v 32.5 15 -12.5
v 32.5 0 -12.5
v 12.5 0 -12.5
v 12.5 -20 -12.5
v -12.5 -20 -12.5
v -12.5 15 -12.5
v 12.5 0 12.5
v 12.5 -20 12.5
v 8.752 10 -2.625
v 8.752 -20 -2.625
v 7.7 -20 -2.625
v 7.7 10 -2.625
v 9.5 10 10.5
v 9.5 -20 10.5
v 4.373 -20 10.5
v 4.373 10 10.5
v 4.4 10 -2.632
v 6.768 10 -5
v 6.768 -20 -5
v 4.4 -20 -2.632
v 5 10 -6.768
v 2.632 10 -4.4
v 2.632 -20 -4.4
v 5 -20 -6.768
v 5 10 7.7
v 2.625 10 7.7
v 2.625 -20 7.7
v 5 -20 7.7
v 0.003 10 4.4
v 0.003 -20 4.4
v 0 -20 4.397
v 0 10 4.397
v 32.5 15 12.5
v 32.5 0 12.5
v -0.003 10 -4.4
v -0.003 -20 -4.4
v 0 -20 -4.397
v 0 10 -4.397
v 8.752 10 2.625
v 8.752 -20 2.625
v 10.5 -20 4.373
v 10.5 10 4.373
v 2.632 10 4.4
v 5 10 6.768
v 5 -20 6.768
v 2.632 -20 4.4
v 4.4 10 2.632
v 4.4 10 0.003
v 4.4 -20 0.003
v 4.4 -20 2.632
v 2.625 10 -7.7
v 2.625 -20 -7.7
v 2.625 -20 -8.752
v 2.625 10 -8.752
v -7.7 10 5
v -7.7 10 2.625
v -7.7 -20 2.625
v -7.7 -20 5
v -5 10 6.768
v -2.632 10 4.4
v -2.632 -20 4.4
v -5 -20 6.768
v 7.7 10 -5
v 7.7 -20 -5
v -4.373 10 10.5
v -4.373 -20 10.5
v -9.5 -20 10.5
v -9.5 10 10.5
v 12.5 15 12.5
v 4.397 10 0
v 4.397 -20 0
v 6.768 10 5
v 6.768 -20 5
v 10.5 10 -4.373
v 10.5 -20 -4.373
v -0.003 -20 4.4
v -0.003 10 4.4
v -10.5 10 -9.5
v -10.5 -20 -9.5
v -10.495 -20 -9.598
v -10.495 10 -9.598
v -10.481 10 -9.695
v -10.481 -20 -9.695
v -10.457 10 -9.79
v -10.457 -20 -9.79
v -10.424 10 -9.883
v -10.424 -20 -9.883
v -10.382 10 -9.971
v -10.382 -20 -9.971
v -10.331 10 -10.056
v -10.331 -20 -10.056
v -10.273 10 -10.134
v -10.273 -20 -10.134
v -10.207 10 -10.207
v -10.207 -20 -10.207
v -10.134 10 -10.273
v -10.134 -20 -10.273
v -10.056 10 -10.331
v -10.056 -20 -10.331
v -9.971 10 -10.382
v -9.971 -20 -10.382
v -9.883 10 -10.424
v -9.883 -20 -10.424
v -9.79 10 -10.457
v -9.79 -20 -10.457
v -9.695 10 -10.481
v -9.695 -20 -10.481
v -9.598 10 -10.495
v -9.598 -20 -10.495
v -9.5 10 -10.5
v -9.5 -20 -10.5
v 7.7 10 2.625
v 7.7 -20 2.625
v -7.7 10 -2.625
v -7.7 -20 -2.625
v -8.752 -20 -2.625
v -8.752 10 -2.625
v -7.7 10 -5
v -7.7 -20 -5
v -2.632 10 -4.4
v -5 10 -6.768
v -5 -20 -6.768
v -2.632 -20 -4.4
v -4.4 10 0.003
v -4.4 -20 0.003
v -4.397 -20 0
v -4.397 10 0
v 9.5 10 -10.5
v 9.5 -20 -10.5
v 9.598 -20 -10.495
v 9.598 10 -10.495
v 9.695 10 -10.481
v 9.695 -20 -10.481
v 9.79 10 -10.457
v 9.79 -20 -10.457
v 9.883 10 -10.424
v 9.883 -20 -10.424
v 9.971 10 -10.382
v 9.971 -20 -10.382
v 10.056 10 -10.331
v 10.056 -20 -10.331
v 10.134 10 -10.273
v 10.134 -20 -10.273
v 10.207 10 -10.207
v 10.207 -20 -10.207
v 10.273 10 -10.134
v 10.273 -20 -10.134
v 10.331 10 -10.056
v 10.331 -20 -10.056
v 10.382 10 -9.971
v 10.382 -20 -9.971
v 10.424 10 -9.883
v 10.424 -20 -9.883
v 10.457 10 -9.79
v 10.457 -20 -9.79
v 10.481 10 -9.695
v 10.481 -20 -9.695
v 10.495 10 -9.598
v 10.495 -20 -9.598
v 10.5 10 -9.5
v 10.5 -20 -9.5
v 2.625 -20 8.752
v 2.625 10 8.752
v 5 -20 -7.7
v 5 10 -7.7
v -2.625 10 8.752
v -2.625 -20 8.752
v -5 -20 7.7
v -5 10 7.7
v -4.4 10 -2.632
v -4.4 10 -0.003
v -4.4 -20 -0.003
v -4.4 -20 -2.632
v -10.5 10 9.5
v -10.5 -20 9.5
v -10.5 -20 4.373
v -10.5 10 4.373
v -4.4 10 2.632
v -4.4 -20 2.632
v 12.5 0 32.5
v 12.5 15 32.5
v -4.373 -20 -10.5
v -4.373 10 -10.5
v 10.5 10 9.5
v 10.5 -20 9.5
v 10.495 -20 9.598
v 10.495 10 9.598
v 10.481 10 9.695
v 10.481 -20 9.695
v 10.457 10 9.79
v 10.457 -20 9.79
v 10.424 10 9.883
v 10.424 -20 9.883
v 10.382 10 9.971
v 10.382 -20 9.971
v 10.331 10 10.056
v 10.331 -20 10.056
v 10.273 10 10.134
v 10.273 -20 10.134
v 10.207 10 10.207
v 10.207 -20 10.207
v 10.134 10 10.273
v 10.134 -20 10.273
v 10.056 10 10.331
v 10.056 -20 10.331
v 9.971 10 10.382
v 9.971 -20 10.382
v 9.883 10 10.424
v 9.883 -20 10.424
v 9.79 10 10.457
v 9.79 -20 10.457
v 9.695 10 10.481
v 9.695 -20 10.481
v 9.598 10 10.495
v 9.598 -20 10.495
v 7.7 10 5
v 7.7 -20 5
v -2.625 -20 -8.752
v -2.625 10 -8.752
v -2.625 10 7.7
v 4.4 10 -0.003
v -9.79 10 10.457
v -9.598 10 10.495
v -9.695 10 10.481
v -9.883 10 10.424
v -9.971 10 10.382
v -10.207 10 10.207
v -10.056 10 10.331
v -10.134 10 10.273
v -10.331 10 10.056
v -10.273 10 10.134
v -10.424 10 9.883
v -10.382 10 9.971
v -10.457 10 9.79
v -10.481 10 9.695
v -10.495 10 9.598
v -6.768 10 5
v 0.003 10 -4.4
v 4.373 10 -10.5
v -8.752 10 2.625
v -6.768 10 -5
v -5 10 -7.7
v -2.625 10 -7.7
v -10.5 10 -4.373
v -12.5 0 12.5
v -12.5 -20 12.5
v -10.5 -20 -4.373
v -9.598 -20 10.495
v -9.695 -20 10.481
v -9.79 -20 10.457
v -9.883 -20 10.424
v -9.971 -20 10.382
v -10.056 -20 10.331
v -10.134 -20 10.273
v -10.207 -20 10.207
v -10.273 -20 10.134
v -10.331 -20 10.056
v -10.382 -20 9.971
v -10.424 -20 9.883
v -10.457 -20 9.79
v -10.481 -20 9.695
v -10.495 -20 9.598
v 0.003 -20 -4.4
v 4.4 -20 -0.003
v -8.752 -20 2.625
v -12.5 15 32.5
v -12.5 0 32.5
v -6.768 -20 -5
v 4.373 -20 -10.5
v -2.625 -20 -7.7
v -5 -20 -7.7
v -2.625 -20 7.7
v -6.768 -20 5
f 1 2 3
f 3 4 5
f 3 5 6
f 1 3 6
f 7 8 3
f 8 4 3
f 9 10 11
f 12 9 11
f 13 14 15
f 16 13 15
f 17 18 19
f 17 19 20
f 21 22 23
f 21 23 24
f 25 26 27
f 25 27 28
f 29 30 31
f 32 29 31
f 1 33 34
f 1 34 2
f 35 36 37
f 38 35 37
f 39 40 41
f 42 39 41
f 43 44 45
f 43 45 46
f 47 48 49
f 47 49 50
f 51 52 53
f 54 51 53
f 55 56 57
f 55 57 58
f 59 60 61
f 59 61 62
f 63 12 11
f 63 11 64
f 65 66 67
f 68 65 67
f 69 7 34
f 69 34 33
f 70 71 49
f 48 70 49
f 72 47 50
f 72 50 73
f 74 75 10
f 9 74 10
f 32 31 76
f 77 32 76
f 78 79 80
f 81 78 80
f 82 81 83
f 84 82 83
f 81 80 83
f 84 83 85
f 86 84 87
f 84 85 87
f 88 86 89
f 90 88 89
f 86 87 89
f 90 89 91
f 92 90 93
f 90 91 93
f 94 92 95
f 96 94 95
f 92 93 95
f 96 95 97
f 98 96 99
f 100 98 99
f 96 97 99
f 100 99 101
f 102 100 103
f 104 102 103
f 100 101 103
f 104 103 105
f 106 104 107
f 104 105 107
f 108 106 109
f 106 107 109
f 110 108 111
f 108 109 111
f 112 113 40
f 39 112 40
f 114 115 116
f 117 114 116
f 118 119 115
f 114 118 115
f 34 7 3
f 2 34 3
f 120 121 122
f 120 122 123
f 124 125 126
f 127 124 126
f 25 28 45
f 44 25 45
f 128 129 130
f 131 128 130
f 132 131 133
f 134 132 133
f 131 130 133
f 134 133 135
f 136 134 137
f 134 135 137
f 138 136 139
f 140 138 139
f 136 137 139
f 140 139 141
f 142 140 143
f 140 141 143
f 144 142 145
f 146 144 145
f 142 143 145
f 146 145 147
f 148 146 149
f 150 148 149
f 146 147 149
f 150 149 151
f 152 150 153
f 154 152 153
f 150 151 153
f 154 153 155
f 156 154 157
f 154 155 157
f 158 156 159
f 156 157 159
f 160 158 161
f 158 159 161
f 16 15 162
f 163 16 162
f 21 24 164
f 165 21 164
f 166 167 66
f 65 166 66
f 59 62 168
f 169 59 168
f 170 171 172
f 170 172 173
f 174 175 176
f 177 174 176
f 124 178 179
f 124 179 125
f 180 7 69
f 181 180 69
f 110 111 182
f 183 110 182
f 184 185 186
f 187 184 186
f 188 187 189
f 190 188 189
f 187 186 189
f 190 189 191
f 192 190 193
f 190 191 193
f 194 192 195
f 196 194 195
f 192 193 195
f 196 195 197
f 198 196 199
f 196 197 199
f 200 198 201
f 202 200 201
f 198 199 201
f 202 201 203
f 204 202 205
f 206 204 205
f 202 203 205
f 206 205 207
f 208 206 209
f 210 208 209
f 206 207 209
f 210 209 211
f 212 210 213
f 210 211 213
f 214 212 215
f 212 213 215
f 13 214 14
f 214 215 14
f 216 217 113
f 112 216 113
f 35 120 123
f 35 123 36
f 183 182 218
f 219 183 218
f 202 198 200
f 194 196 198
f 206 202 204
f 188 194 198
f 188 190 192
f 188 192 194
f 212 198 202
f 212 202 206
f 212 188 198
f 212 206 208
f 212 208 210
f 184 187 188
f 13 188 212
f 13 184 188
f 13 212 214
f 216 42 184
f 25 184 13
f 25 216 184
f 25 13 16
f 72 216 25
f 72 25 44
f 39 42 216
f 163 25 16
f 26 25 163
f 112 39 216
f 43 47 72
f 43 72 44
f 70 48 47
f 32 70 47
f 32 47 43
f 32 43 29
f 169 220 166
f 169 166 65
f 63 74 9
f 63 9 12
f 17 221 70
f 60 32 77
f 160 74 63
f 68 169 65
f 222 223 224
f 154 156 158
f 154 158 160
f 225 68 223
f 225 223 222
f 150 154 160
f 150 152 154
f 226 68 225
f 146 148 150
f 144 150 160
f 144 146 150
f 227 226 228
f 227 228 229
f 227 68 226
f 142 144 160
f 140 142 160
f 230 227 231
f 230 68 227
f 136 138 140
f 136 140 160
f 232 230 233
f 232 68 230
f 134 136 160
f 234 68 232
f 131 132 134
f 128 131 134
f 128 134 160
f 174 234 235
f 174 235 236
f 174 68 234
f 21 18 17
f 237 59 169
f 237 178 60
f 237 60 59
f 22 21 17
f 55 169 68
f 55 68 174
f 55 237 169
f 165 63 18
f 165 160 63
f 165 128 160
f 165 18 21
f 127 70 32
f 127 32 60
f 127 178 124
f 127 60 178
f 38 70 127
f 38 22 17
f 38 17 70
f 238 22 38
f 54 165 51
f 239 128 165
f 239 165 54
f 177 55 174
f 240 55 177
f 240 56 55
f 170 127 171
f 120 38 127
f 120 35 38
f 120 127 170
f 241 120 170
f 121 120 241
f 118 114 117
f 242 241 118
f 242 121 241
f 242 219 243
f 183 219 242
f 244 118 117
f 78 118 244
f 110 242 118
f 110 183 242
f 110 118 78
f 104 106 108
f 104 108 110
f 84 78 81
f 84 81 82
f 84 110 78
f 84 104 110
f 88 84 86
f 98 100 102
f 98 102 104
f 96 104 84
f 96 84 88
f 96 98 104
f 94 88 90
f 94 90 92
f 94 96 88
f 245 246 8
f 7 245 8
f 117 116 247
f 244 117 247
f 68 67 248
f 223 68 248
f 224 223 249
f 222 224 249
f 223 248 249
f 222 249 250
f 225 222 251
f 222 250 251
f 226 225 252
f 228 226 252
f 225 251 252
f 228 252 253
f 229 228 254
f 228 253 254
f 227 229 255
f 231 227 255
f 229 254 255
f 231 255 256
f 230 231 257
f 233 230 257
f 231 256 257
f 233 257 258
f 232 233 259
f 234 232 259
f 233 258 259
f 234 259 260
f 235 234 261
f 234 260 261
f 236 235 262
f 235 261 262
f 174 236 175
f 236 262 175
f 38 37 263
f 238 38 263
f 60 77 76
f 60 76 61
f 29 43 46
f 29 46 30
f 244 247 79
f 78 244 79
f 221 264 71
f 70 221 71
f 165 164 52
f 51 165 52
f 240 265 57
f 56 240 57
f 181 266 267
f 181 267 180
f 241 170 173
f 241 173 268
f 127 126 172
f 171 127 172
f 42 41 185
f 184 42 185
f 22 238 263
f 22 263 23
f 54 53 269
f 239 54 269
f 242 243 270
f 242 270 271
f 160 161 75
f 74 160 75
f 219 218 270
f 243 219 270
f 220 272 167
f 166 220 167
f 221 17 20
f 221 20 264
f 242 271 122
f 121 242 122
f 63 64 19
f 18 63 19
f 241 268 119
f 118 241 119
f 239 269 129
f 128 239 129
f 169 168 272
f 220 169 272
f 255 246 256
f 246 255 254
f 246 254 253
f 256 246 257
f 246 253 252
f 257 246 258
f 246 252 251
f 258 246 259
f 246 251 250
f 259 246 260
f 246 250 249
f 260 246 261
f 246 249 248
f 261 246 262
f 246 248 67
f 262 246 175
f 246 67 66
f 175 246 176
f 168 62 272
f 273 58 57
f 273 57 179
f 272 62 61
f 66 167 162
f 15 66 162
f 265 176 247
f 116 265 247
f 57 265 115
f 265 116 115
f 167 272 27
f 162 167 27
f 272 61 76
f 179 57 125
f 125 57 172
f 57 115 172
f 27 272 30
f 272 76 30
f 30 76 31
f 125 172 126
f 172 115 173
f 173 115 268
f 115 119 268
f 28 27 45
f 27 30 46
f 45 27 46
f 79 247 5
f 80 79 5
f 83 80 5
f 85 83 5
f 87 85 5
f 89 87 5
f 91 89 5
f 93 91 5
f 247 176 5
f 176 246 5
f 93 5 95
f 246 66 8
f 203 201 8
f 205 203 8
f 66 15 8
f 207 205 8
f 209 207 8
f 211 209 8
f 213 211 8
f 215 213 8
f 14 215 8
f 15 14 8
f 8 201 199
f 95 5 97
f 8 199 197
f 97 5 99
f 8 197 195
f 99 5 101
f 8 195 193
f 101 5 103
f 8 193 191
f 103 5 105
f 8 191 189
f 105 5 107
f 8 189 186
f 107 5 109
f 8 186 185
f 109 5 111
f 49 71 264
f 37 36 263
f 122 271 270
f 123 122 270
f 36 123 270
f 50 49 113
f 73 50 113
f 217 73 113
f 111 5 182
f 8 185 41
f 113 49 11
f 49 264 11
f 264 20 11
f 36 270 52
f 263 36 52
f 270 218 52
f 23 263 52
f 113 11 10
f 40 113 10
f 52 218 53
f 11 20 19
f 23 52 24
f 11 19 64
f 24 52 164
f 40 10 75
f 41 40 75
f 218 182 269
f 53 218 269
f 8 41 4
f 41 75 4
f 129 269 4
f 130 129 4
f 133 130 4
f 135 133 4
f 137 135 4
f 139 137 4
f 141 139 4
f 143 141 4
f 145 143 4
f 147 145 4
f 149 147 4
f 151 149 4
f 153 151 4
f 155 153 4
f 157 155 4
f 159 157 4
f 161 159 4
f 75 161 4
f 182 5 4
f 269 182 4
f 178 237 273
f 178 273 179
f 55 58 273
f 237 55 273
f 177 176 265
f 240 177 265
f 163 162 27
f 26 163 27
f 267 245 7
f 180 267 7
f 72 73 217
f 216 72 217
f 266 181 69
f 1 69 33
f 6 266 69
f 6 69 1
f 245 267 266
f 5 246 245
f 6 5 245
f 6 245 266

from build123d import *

# Parameters (mm, degrees)
BOSS_EXTRUDE1_DEPTH      = 15
BOSS_EXTRUDE1_DEPTH_BACK = 20
SKETCH3_W                = 25
SKETCH3_H                = 25
CUT_EXTRUDE1_DEPTH       = 30
SKETCH5_W                = 25
SKETCH5_H                = 15
BOSS_EXTRUDE2_DEPTH      = 20
SKETCH6_W                = 25
SKETCH6_H                = 15
BOSS_EXTRUDE3_DEPTH      = 20


with BuildPart() as part:
    # Sketch3 → Boss-Extrude1 (new, two sides: drawn at the far end of the back side and taken through both)
    with BuildSketch(Plane(origin=(0, 0, 0), x_dir=(1, 0, 0), z_dir=(0, 1, 0)).offset(-BOSS_EXTRUDE1_DEPTH_BACK)):
        Rectangle(SKETCH3_W, SKETCH3_H)
    extrude(amount=BOSS_EXTRUDE1_DEPTH + BOSS_EXTRUDE1_DEPTH_BACK)

    # Extrusion Profile → Cut-Extrude1 (cut)
    with BuildSketch(Plane(origin=(0, -20, 0), x_dir=(-1, 0, 0), z_dir=(0, -1, 0))):
        with BuildLine():
            Line((4.4, -0.002893219), (4.397106781, 0))
            Line((4.397106781, 0), (4.4, 0.002893219))
            Line((4.4, 0.002893219), (4.4, 2.632233047))
            Line((4.4, 2.632233047), (6.767766953, 5))
            Line((6.767766953, 5), (7.7, 5))
            Line((7.7, 5), (7.7, 2.625))
            Line((7.7, 2.625), (8.752106781, 2.625))
            Line((8.752106781, 2.625), (10.5, 4.372893219))
            Line((10.5, 4.372893219), (10.5, 9.5))
            ThreePointArc((10.5, 9.5), (10.207106781, 10.207106781), (9.5, 10.5))
            Line((9.5, 10.5), (4.372893219, 10.5))
            Line((4.372893219, 10.5), (2.625, 8.752106781))
            Line((2.625, 8.752106781), (2.625, 7.7))
            Line((2.625, 7.7), (5, 7.7))
            Line((5, 7.7), (5, 6.767766953))
            Line((5, 6.767766953), (2.632233047, 4.4))
            Line((2.632233047, 4.4), (0.002893219, 4.4))
            Line((0.002893219, 4.4), (0, 4.397106781))
            Line((0, 4.397106781), (-0.002893219, 4.4))
            Line((-0.002893219, 4.4), (-2.632233047, 4.4))
            Line((-2.632233047, 4.4), (-5, 6.767766953))
            Line((-5, 6.767766953), (-5, 7.7))
            Line((-5, 7.7), (-2.625, 7.7))
            Line((-2.625, 7.7), (-2.625, 8.752106781))
            Line((-2.625, 8.752106781), (-4.372893219, 10.5))
            Line((-4.372893219, 10.5), (-9.5, 10.5))
            ThreePointArc((-9.5, 10.5), (-10.207106781, 10.207106781), (-10.5, 9.5))
            Line((-10.5, 9.5), (-10.5, 4.372893219))
            Line((-10.5, 4.372893219), (-8.752106781, 2.625))
            Line((-8.752106781, 2.625), (-7.7, 2.625))
            Line((-7.7, 2.625), (-7.7, 5))
            Line((-7.7, 5), (-6.767766953, 5))
            Line((-6.767766953, 5), (-4.4, 2.632233047))
            Line((-4.4, 2.632233047), (-4.4, 0.002893219))
            Line((-4.4, 0.002893219), (-4.397106781, 0))
            Line((-4.397106781, 0), (-4.4, -0.002893219))
            Line((-4.4, -0.002893219), (-4.4, -2.632233047))
            Line((-4.4, -2.632233047), (-6.767766953, -5))
            Line((-6.767766953, -5), (-7.7, -5))
            Line((-7.7, -5), (-7.7, -2.625))
            Line((-7.7, -2.625), (-8.752106781, -2.625))
            Line((-8.752106781, -2.625), (-10.5, -4.372893219))
            Line((-10.5, -4.372893219), (-10.5, -9.5))
            ThreePointArc((-10.5, -9.5), (-10.207106781, -10.207106781), (-9.5, -10.5))
            Line((-9.5, -10.5), (-4.372893219, -10.5))
            Line((-4.372893219, -10.5), (-2.625, -8.752106781))
            Line((-2.625, -8.752106781), (-2.625, -7.7))
            Line((-2.625, -7.7), (-5, -7.7))
            Line((-5, -7.7), (-5, -6.767766953))
            Line((-5, -6.767766953), (-2.632233047, -4.4))
            Line((-2.632233047, -4.4), (-0.002893219, -4.4))
            Line((-0.002893219, -4.4), (0, -4.397106781))
            Line((0, -4.397106781), (0.002893219, -4.4))
            Line((0.002893219, -4.4), (2.632233047, -4.4))
            Line((2.632233047, -4.4), (5, -6.767766953))
            Line((5, -6.767766953), (5, -7.7))
            Line((5, -7.7), (2.625, -7.7))
            Line((2.625, -7.7), (2.625, -8.752106781))
            Line((2.625, -8.752106781), (4.372893219, -10.5))
            Line((4.372893219, -10.5), (9.5, -10.5))
            ThreePointArc((9.5, -10.5), (10.207106781, -10.207106781), (10.5, -9.5))
            Line((10.5, -9.5), (10.5, -4.372893219))
            Line((10.5, -4.372893219), (8.752106781, -2.625))
            Line((8.752106781, -2.625), (7.7, -2.625))
            Line((7.7, -2.625), (7.7, -5))
            Line((7.7, -5), (6.767766953, -5))
            Line((6.767766953, -5), (4.4, -2.632233047))
            Line((4.4, -2.632233047), (4.4, -0.002893219))
        make_face()
    extrude(amount=-CUT_EXTRUDE1_DEPTH, mode=Mode.SUBTRACT)

    # Sketch5 → Boss-Extrude2 (add)
    with BuildSketch(Plane.XY.offset(12.5)):
        with Locations((0, 7.5)):
            Rectangle(SKETCH5_W, SKETCH5_H)
    extrude(amount=BOSS_EXTRUDE2_DEPTH)

    # Sketch6 → Boss-Extrude3 (add)
    with BuildSketch(Plane(origin=(12.5, 0, 0), x_dir=(0, 0, -1), z_dir=(1, 0, 0))):
        with Locations((0, 7.5)):
            Rectangle(SKETCH6_W, SKETCH6_H)
    extrude(amount=BOSS_EXTRUDE3_DEPTH)


solid = part.part
